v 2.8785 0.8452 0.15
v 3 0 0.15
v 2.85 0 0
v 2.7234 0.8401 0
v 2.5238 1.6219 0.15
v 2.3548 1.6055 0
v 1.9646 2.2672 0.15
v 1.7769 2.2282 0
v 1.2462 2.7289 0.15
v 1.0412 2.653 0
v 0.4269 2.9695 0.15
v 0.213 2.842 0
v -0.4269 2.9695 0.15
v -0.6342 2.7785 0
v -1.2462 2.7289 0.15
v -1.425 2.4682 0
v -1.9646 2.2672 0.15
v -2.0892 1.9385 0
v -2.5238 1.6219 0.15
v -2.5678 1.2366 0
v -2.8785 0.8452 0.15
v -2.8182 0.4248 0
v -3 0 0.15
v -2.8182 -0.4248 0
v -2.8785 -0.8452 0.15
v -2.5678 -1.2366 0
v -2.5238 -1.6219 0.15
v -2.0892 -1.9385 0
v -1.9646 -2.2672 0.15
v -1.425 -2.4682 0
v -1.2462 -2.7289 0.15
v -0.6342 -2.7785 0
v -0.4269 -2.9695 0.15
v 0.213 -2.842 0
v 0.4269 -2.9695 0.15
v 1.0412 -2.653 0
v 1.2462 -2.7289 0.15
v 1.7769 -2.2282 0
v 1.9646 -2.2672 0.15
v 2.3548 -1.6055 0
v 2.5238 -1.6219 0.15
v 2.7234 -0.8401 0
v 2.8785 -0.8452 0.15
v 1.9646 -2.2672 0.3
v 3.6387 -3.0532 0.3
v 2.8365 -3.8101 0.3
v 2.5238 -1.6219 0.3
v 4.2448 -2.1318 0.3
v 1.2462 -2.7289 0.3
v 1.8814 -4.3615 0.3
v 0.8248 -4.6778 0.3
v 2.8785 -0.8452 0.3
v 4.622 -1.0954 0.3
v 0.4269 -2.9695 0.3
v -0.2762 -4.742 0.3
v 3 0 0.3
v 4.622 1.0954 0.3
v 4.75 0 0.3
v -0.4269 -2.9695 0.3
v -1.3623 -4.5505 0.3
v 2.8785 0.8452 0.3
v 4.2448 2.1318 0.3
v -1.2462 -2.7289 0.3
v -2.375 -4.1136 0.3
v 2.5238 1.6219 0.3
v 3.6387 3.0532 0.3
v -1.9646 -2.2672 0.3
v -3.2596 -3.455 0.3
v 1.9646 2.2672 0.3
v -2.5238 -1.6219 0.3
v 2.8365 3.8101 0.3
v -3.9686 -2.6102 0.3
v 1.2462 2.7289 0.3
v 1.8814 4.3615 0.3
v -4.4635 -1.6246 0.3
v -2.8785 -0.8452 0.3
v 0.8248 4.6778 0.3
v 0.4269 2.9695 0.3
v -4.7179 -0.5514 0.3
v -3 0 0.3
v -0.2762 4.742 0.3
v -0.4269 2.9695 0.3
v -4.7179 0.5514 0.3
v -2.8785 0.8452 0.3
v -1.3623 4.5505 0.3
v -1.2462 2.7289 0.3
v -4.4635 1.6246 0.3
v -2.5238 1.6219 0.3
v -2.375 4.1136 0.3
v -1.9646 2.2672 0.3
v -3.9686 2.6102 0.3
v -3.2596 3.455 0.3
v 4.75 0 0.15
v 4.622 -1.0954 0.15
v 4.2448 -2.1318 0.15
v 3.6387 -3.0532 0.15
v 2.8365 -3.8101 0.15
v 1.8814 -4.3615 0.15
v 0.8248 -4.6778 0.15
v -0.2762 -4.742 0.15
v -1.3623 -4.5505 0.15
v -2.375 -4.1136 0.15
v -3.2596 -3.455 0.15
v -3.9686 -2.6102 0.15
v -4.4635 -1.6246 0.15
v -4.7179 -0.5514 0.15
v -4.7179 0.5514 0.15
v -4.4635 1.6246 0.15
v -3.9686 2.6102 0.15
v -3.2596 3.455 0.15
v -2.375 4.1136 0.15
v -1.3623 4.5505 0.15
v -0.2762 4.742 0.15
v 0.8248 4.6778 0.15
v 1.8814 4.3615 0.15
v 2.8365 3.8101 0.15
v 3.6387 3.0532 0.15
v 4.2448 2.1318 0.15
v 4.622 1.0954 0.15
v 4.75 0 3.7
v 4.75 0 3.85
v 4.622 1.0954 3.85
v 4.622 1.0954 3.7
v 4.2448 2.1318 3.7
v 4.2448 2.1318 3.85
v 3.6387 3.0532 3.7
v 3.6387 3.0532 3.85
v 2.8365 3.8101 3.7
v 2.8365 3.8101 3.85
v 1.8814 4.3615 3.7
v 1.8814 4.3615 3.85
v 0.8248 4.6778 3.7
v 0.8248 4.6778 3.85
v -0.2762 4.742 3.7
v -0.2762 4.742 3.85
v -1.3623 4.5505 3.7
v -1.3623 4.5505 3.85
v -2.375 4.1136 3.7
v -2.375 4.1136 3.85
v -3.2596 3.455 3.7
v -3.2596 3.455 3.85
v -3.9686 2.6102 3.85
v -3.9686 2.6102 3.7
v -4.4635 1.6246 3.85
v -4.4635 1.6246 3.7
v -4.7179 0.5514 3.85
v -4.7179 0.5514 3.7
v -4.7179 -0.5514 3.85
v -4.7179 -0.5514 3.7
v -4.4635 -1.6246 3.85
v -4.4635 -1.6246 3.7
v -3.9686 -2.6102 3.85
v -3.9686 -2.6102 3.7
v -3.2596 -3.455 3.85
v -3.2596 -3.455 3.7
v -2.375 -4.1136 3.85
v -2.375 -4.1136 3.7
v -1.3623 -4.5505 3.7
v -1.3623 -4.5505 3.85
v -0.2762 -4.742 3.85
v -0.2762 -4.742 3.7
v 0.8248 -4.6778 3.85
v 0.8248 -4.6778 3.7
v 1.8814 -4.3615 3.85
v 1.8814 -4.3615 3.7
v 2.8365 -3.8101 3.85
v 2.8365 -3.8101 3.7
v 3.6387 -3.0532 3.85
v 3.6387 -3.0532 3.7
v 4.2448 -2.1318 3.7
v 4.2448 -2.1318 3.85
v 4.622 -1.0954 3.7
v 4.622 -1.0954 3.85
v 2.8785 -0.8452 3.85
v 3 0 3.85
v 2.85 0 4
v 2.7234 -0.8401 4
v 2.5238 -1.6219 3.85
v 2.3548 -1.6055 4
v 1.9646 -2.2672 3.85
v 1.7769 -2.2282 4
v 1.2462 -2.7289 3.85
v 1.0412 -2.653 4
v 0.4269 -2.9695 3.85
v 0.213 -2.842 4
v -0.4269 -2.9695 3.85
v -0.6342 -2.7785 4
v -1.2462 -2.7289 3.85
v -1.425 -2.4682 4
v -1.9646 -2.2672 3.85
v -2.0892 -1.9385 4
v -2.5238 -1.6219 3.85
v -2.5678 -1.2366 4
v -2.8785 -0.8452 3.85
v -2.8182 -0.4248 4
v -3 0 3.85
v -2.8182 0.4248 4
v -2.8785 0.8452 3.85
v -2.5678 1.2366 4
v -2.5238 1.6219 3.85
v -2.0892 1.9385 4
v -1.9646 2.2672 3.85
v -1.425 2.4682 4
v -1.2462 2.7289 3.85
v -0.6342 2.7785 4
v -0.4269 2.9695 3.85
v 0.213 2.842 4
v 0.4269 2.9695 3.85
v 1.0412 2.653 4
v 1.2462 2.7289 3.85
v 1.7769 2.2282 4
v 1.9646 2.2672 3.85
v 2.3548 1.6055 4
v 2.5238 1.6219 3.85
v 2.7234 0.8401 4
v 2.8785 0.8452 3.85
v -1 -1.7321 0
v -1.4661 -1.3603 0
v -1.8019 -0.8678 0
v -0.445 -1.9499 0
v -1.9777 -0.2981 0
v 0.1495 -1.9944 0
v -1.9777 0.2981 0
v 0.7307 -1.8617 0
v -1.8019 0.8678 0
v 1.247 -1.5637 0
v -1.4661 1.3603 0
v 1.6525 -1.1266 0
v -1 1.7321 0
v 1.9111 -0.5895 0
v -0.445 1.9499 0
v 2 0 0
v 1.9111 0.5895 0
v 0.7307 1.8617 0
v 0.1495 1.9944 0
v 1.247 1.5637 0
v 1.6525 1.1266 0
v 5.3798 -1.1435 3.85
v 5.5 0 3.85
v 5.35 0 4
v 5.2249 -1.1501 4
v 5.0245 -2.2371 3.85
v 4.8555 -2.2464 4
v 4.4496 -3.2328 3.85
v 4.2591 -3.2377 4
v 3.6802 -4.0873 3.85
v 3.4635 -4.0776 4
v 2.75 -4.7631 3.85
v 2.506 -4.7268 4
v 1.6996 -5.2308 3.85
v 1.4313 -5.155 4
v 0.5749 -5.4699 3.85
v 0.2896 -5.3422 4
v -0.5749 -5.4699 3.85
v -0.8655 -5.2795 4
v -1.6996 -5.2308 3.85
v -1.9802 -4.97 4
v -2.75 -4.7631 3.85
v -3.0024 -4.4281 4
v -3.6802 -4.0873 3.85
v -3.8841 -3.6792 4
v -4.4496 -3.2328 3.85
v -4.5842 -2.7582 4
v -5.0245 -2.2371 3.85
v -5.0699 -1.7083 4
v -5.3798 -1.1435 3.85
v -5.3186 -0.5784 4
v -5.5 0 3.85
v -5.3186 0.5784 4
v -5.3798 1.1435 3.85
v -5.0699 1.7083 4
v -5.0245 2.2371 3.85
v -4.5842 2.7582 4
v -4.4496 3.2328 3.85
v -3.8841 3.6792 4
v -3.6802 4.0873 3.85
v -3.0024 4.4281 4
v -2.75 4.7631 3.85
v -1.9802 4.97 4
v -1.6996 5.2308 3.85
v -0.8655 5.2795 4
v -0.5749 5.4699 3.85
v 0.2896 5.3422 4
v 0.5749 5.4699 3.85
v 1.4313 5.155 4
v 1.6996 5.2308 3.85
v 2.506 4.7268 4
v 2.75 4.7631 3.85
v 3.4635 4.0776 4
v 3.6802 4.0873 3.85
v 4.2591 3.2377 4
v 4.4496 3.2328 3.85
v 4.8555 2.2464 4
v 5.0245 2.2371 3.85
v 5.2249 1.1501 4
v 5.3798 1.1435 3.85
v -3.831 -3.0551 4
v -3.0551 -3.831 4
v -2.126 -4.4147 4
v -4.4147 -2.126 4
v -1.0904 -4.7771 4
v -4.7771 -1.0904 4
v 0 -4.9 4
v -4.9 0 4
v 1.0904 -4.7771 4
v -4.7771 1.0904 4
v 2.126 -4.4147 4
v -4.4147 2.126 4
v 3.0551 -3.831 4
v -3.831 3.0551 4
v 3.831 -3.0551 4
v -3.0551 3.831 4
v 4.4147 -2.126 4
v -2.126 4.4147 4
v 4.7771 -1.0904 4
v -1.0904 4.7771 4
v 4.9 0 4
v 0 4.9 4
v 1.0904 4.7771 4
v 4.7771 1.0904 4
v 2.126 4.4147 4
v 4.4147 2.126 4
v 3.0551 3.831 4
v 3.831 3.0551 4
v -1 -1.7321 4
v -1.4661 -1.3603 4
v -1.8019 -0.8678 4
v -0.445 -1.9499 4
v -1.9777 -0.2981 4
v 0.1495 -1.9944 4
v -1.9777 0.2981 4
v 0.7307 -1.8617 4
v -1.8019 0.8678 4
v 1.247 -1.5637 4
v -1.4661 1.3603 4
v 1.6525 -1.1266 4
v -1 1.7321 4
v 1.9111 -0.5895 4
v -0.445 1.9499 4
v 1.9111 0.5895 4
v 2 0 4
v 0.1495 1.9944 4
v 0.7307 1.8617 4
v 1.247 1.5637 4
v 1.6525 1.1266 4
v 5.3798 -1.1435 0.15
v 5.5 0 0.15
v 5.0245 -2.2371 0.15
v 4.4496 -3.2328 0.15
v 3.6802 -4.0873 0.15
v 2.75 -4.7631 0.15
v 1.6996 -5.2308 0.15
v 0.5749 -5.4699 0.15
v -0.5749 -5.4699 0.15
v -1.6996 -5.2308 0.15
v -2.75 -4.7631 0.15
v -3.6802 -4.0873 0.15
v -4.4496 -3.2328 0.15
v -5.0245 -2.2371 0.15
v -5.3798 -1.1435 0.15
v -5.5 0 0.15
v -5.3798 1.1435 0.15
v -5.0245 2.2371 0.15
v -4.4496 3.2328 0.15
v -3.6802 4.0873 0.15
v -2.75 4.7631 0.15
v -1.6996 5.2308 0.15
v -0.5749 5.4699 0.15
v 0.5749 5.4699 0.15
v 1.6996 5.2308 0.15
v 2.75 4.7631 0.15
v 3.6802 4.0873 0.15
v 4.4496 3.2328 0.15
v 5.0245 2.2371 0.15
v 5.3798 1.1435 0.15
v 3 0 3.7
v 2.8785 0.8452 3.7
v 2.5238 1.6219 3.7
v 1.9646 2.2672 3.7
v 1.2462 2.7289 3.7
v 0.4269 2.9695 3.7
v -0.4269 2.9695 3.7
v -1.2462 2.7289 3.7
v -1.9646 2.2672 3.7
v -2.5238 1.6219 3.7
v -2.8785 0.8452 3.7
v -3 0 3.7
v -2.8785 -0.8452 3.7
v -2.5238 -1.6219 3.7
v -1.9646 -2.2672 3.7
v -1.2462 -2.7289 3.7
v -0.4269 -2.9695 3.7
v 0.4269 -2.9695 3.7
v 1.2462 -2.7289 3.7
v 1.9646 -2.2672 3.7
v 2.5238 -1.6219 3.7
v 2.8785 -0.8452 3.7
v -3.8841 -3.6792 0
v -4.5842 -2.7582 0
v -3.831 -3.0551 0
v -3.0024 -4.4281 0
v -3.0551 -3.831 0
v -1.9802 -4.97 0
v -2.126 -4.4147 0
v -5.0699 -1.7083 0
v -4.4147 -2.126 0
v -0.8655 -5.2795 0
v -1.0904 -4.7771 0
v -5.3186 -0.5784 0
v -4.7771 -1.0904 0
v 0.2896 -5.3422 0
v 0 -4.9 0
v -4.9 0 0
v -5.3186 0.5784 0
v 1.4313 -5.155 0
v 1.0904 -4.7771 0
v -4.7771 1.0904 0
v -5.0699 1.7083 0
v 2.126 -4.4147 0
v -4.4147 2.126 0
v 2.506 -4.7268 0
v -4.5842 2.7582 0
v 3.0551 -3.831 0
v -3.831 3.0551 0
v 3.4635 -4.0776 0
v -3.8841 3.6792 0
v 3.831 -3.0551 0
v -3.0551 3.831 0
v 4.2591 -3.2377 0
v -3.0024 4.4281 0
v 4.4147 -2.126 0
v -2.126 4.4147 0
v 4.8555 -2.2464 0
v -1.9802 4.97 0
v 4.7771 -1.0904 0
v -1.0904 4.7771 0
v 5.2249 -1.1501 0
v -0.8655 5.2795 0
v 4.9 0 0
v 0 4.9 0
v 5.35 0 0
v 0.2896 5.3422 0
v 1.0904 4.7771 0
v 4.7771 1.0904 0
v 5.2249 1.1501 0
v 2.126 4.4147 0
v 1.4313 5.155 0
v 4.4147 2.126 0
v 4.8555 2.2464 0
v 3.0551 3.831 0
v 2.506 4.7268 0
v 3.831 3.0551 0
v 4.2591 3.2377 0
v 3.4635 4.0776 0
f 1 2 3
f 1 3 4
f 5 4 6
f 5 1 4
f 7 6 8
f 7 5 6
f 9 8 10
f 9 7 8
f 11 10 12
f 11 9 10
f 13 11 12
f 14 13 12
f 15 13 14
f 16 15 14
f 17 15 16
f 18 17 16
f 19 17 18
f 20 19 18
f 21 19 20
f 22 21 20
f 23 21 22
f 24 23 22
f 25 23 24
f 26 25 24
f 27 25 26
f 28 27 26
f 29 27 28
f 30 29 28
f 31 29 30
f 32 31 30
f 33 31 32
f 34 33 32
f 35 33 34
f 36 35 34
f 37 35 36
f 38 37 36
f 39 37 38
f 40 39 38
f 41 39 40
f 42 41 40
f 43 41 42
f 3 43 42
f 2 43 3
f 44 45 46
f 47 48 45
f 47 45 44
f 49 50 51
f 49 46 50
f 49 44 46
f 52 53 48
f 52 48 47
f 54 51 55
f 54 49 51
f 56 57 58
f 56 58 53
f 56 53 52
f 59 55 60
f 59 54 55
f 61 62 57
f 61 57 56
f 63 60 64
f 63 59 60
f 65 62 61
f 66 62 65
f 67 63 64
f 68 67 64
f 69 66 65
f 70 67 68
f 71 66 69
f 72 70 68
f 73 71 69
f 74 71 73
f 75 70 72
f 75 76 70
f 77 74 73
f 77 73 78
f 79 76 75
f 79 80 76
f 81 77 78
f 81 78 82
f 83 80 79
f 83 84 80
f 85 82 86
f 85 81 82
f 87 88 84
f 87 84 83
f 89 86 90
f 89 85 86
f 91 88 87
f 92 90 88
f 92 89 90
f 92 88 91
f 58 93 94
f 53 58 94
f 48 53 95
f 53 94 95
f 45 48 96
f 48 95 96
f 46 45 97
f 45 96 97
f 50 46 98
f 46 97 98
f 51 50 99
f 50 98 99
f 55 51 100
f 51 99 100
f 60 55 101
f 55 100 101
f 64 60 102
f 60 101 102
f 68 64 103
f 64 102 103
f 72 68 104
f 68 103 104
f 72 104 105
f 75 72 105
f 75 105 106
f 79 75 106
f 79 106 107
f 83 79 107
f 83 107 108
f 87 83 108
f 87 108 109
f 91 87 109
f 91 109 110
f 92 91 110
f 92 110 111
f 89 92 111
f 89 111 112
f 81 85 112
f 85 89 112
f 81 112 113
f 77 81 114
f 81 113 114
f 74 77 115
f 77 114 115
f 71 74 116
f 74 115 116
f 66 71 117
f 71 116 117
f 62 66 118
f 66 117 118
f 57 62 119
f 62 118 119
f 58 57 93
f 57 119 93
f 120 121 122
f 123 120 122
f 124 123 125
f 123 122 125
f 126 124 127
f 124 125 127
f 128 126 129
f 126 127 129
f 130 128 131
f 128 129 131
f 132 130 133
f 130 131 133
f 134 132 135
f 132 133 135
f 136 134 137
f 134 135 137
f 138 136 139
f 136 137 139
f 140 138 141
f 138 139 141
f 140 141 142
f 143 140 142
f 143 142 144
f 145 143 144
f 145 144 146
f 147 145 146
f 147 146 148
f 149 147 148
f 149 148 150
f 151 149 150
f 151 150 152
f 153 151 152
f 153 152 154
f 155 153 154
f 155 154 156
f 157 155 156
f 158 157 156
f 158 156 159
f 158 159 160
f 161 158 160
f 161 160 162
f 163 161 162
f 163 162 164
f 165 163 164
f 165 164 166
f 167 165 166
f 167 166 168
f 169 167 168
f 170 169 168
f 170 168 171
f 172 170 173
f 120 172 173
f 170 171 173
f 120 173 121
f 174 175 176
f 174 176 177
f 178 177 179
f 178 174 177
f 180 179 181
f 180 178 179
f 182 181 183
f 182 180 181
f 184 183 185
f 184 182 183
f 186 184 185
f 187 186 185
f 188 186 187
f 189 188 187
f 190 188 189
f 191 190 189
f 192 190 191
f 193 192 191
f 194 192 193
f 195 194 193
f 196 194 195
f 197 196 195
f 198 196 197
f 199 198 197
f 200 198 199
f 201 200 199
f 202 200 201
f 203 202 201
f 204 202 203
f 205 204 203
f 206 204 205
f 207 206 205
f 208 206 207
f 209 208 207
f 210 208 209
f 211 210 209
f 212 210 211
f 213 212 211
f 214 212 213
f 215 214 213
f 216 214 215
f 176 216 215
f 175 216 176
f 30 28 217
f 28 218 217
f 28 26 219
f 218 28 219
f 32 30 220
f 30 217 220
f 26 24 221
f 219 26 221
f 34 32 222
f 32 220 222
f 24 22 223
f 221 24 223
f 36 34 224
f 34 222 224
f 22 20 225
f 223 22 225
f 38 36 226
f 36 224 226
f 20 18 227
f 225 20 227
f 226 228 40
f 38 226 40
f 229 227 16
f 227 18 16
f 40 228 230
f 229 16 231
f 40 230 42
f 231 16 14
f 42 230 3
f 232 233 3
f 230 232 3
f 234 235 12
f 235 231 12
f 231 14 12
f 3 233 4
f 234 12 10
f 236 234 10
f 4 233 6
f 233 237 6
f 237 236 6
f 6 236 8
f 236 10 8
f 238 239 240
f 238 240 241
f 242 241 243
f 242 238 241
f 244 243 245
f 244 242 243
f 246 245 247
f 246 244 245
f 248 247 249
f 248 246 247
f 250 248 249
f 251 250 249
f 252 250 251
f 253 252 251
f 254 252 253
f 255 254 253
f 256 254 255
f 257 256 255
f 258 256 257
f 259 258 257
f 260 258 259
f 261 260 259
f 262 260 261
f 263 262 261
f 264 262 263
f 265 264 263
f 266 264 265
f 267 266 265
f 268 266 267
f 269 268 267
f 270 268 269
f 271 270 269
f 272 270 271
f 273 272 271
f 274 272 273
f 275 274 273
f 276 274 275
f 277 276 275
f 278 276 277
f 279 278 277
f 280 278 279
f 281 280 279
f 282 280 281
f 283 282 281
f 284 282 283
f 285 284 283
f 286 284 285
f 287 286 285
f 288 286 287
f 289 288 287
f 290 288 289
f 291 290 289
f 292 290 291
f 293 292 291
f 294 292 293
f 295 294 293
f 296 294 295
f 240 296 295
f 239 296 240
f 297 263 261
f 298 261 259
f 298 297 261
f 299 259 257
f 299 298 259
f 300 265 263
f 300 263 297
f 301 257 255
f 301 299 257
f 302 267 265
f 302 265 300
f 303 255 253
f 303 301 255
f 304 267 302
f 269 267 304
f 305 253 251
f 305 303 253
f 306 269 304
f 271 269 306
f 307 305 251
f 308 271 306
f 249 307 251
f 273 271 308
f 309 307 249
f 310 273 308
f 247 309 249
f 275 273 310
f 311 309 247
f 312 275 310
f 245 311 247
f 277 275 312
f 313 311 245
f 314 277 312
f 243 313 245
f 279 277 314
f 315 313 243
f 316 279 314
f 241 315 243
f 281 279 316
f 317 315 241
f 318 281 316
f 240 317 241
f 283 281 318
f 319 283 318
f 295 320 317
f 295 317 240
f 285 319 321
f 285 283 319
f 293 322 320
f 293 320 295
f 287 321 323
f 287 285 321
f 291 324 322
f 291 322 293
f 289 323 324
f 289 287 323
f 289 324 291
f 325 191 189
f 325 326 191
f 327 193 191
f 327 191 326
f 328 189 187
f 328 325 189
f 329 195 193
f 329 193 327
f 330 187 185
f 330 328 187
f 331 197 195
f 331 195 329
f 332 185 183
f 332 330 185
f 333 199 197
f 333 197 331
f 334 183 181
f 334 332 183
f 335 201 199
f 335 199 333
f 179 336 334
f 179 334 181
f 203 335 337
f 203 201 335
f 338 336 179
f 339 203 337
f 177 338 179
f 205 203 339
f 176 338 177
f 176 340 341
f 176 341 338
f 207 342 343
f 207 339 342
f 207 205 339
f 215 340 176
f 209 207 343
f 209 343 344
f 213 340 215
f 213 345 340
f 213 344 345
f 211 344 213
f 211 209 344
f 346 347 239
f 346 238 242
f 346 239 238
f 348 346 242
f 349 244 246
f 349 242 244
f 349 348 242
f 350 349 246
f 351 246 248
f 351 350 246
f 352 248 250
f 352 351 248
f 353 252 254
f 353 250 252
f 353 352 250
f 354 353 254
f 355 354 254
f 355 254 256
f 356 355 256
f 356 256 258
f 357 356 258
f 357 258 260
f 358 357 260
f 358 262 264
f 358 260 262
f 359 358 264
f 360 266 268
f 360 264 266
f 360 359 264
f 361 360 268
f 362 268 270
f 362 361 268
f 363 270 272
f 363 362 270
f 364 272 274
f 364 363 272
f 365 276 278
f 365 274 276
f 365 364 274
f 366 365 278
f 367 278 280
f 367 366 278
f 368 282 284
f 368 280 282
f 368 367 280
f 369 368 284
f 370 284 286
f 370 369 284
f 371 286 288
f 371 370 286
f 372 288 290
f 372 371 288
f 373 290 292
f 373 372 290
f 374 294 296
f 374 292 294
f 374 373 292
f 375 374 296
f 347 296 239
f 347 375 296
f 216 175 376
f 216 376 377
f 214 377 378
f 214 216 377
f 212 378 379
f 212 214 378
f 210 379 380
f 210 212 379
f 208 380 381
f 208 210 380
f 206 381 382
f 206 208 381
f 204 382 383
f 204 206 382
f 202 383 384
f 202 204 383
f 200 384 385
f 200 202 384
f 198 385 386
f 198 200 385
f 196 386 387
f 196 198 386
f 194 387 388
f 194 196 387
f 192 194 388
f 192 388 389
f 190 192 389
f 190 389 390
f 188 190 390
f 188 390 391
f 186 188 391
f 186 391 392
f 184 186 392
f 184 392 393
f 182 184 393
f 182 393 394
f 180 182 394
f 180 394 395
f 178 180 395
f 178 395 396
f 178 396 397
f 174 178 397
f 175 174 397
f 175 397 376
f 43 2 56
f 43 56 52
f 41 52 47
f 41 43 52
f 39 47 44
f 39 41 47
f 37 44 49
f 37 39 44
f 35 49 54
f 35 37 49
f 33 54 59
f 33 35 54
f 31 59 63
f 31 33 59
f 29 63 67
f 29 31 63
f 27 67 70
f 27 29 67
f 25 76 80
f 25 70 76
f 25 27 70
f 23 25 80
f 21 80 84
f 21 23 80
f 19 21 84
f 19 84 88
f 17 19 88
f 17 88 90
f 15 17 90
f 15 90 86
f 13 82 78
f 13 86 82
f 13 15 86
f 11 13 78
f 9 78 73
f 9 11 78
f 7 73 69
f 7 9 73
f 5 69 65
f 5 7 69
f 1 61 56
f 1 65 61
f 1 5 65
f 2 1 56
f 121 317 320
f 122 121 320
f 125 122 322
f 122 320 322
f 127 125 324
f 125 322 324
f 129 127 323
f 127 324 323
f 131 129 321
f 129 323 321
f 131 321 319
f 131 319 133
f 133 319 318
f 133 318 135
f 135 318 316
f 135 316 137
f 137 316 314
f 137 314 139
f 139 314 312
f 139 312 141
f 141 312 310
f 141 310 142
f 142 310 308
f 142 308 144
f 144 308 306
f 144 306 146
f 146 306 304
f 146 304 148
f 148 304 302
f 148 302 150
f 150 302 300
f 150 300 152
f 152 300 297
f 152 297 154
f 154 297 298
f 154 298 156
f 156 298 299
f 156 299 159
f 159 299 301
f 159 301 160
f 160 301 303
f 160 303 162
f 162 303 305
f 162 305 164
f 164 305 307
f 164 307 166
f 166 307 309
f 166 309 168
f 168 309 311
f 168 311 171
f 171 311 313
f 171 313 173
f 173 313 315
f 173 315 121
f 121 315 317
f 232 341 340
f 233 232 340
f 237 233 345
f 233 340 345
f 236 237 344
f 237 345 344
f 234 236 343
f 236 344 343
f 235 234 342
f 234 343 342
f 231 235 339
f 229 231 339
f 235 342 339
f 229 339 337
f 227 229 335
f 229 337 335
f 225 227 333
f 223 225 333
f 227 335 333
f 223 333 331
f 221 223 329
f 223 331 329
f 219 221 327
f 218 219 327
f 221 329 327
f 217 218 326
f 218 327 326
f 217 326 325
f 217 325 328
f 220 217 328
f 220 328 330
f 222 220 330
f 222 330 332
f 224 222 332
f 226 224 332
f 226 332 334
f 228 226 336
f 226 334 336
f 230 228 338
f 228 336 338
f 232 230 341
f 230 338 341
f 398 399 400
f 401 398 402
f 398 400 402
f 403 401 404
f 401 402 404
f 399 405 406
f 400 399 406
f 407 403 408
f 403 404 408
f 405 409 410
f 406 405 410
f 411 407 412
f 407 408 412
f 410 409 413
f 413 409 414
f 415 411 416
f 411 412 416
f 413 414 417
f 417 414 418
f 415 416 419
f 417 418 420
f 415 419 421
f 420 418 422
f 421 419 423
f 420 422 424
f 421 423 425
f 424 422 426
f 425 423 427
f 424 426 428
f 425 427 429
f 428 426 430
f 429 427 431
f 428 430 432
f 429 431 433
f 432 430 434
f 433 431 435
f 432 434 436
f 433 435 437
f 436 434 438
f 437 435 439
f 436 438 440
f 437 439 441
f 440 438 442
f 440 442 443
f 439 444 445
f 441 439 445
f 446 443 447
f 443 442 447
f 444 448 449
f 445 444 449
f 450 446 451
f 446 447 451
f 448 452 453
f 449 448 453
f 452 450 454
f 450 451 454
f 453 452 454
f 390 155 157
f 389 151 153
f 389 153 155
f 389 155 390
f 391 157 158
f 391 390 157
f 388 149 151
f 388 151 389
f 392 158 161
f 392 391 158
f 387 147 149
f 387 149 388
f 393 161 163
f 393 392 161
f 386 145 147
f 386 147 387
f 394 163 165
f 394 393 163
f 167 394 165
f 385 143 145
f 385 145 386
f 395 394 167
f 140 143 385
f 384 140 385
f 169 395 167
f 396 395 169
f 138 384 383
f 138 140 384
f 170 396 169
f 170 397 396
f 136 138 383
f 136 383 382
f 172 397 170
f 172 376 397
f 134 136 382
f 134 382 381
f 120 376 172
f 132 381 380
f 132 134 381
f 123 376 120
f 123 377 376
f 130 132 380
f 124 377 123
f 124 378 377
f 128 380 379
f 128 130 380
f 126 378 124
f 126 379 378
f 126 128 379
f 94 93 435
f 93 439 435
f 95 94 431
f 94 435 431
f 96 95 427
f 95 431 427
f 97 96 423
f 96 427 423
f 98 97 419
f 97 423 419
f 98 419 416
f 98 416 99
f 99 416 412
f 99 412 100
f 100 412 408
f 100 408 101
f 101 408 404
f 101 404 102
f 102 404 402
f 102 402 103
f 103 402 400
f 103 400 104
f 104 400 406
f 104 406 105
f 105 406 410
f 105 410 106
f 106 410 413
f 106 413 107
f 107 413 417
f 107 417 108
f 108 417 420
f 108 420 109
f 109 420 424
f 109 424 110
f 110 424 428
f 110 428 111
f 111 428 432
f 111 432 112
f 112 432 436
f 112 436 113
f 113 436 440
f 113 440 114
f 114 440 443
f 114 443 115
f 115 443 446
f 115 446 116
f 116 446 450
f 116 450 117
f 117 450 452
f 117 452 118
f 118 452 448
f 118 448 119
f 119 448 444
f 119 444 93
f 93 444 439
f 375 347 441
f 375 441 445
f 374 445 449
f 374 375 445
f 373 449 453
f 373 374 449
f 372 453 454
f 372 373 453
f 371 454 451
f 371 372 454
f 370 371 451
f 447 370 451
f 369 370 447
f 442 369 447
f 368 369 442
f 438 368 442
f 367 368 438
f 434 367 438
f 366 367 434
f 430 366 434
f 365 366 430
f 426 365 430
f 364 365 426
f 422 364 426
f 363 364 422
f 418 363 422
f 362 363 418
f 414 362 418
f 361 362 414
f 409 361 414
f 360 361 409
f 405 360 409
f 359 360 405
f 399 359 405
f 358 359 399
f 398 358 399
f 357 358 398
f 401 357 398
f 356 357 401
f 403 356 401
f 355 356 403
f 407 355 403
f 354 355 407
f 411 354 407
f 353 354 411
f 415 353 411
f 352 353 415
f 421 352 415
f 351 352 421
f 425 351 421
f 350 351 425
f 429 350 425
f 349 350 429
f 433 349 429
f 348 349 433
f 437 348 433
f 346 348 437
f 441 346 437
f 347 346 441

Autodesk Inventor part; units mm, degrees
ref_plane "YZ Plane" through (0, 0, 0) normal (1, 0, 0) x (0, 1, 0)
ref_plane "XZ Plane" through (0, 0, 0) normal (0, 1, 0) x (-1, 0, 0)
sketch "Sketch1" plane through (0, 0, 0) normal (0, 0, 1) x (1, 0, 0)
  circle A0 centre (0, 0) radius 5.5
  dimension "d0" = 11
extrude "Extrusion1" add sketch "Sketch1" along normal blind 4
sketch "Sketch2" plane through (0, 0, 4) normal (0, 0, 1) x (1, 0, 0)
  circle A0 centre (0, 0) radius 2
  dimension "d3" = 4
extrude "Extrusion2" cut sketch "Sketch2" against normal blind 4
sketch "Sketch3" plane through (0, 0, 4) normal (0, 0, 1) x (1, 0, 0)
  circle A0 centre (0, 0) radius 2 projected
  circle A1 centre (0, 0) radius 3
  circle A2 centre (0, 0) radius 4.75
  dimension "d6" = 1
  dimension "d7" = 9.5
extrude "Extrusion3" cut sketch "Sketch3" against normal blind 0.3 contours A2
ref_plane "Work Plane1" through (0, 0, 2) normal (0, 0, 1) x (1, 0, 0)
mirror "Mirror1" about plane through (0, 0, 2) normal (0, 0, 1) of "Extrusion3"
chamfer "Chamfer1" distance 0.15 angle 45 6 edges at (-4.75, 0, 4) (-3, 0, 4) (-3, 0, 0) (-4.75, 0, 0) (-5.5, 0, 4) (-5.5, 0, 0)
properties part number "roller bearing" material "Steel AISI 1118"
